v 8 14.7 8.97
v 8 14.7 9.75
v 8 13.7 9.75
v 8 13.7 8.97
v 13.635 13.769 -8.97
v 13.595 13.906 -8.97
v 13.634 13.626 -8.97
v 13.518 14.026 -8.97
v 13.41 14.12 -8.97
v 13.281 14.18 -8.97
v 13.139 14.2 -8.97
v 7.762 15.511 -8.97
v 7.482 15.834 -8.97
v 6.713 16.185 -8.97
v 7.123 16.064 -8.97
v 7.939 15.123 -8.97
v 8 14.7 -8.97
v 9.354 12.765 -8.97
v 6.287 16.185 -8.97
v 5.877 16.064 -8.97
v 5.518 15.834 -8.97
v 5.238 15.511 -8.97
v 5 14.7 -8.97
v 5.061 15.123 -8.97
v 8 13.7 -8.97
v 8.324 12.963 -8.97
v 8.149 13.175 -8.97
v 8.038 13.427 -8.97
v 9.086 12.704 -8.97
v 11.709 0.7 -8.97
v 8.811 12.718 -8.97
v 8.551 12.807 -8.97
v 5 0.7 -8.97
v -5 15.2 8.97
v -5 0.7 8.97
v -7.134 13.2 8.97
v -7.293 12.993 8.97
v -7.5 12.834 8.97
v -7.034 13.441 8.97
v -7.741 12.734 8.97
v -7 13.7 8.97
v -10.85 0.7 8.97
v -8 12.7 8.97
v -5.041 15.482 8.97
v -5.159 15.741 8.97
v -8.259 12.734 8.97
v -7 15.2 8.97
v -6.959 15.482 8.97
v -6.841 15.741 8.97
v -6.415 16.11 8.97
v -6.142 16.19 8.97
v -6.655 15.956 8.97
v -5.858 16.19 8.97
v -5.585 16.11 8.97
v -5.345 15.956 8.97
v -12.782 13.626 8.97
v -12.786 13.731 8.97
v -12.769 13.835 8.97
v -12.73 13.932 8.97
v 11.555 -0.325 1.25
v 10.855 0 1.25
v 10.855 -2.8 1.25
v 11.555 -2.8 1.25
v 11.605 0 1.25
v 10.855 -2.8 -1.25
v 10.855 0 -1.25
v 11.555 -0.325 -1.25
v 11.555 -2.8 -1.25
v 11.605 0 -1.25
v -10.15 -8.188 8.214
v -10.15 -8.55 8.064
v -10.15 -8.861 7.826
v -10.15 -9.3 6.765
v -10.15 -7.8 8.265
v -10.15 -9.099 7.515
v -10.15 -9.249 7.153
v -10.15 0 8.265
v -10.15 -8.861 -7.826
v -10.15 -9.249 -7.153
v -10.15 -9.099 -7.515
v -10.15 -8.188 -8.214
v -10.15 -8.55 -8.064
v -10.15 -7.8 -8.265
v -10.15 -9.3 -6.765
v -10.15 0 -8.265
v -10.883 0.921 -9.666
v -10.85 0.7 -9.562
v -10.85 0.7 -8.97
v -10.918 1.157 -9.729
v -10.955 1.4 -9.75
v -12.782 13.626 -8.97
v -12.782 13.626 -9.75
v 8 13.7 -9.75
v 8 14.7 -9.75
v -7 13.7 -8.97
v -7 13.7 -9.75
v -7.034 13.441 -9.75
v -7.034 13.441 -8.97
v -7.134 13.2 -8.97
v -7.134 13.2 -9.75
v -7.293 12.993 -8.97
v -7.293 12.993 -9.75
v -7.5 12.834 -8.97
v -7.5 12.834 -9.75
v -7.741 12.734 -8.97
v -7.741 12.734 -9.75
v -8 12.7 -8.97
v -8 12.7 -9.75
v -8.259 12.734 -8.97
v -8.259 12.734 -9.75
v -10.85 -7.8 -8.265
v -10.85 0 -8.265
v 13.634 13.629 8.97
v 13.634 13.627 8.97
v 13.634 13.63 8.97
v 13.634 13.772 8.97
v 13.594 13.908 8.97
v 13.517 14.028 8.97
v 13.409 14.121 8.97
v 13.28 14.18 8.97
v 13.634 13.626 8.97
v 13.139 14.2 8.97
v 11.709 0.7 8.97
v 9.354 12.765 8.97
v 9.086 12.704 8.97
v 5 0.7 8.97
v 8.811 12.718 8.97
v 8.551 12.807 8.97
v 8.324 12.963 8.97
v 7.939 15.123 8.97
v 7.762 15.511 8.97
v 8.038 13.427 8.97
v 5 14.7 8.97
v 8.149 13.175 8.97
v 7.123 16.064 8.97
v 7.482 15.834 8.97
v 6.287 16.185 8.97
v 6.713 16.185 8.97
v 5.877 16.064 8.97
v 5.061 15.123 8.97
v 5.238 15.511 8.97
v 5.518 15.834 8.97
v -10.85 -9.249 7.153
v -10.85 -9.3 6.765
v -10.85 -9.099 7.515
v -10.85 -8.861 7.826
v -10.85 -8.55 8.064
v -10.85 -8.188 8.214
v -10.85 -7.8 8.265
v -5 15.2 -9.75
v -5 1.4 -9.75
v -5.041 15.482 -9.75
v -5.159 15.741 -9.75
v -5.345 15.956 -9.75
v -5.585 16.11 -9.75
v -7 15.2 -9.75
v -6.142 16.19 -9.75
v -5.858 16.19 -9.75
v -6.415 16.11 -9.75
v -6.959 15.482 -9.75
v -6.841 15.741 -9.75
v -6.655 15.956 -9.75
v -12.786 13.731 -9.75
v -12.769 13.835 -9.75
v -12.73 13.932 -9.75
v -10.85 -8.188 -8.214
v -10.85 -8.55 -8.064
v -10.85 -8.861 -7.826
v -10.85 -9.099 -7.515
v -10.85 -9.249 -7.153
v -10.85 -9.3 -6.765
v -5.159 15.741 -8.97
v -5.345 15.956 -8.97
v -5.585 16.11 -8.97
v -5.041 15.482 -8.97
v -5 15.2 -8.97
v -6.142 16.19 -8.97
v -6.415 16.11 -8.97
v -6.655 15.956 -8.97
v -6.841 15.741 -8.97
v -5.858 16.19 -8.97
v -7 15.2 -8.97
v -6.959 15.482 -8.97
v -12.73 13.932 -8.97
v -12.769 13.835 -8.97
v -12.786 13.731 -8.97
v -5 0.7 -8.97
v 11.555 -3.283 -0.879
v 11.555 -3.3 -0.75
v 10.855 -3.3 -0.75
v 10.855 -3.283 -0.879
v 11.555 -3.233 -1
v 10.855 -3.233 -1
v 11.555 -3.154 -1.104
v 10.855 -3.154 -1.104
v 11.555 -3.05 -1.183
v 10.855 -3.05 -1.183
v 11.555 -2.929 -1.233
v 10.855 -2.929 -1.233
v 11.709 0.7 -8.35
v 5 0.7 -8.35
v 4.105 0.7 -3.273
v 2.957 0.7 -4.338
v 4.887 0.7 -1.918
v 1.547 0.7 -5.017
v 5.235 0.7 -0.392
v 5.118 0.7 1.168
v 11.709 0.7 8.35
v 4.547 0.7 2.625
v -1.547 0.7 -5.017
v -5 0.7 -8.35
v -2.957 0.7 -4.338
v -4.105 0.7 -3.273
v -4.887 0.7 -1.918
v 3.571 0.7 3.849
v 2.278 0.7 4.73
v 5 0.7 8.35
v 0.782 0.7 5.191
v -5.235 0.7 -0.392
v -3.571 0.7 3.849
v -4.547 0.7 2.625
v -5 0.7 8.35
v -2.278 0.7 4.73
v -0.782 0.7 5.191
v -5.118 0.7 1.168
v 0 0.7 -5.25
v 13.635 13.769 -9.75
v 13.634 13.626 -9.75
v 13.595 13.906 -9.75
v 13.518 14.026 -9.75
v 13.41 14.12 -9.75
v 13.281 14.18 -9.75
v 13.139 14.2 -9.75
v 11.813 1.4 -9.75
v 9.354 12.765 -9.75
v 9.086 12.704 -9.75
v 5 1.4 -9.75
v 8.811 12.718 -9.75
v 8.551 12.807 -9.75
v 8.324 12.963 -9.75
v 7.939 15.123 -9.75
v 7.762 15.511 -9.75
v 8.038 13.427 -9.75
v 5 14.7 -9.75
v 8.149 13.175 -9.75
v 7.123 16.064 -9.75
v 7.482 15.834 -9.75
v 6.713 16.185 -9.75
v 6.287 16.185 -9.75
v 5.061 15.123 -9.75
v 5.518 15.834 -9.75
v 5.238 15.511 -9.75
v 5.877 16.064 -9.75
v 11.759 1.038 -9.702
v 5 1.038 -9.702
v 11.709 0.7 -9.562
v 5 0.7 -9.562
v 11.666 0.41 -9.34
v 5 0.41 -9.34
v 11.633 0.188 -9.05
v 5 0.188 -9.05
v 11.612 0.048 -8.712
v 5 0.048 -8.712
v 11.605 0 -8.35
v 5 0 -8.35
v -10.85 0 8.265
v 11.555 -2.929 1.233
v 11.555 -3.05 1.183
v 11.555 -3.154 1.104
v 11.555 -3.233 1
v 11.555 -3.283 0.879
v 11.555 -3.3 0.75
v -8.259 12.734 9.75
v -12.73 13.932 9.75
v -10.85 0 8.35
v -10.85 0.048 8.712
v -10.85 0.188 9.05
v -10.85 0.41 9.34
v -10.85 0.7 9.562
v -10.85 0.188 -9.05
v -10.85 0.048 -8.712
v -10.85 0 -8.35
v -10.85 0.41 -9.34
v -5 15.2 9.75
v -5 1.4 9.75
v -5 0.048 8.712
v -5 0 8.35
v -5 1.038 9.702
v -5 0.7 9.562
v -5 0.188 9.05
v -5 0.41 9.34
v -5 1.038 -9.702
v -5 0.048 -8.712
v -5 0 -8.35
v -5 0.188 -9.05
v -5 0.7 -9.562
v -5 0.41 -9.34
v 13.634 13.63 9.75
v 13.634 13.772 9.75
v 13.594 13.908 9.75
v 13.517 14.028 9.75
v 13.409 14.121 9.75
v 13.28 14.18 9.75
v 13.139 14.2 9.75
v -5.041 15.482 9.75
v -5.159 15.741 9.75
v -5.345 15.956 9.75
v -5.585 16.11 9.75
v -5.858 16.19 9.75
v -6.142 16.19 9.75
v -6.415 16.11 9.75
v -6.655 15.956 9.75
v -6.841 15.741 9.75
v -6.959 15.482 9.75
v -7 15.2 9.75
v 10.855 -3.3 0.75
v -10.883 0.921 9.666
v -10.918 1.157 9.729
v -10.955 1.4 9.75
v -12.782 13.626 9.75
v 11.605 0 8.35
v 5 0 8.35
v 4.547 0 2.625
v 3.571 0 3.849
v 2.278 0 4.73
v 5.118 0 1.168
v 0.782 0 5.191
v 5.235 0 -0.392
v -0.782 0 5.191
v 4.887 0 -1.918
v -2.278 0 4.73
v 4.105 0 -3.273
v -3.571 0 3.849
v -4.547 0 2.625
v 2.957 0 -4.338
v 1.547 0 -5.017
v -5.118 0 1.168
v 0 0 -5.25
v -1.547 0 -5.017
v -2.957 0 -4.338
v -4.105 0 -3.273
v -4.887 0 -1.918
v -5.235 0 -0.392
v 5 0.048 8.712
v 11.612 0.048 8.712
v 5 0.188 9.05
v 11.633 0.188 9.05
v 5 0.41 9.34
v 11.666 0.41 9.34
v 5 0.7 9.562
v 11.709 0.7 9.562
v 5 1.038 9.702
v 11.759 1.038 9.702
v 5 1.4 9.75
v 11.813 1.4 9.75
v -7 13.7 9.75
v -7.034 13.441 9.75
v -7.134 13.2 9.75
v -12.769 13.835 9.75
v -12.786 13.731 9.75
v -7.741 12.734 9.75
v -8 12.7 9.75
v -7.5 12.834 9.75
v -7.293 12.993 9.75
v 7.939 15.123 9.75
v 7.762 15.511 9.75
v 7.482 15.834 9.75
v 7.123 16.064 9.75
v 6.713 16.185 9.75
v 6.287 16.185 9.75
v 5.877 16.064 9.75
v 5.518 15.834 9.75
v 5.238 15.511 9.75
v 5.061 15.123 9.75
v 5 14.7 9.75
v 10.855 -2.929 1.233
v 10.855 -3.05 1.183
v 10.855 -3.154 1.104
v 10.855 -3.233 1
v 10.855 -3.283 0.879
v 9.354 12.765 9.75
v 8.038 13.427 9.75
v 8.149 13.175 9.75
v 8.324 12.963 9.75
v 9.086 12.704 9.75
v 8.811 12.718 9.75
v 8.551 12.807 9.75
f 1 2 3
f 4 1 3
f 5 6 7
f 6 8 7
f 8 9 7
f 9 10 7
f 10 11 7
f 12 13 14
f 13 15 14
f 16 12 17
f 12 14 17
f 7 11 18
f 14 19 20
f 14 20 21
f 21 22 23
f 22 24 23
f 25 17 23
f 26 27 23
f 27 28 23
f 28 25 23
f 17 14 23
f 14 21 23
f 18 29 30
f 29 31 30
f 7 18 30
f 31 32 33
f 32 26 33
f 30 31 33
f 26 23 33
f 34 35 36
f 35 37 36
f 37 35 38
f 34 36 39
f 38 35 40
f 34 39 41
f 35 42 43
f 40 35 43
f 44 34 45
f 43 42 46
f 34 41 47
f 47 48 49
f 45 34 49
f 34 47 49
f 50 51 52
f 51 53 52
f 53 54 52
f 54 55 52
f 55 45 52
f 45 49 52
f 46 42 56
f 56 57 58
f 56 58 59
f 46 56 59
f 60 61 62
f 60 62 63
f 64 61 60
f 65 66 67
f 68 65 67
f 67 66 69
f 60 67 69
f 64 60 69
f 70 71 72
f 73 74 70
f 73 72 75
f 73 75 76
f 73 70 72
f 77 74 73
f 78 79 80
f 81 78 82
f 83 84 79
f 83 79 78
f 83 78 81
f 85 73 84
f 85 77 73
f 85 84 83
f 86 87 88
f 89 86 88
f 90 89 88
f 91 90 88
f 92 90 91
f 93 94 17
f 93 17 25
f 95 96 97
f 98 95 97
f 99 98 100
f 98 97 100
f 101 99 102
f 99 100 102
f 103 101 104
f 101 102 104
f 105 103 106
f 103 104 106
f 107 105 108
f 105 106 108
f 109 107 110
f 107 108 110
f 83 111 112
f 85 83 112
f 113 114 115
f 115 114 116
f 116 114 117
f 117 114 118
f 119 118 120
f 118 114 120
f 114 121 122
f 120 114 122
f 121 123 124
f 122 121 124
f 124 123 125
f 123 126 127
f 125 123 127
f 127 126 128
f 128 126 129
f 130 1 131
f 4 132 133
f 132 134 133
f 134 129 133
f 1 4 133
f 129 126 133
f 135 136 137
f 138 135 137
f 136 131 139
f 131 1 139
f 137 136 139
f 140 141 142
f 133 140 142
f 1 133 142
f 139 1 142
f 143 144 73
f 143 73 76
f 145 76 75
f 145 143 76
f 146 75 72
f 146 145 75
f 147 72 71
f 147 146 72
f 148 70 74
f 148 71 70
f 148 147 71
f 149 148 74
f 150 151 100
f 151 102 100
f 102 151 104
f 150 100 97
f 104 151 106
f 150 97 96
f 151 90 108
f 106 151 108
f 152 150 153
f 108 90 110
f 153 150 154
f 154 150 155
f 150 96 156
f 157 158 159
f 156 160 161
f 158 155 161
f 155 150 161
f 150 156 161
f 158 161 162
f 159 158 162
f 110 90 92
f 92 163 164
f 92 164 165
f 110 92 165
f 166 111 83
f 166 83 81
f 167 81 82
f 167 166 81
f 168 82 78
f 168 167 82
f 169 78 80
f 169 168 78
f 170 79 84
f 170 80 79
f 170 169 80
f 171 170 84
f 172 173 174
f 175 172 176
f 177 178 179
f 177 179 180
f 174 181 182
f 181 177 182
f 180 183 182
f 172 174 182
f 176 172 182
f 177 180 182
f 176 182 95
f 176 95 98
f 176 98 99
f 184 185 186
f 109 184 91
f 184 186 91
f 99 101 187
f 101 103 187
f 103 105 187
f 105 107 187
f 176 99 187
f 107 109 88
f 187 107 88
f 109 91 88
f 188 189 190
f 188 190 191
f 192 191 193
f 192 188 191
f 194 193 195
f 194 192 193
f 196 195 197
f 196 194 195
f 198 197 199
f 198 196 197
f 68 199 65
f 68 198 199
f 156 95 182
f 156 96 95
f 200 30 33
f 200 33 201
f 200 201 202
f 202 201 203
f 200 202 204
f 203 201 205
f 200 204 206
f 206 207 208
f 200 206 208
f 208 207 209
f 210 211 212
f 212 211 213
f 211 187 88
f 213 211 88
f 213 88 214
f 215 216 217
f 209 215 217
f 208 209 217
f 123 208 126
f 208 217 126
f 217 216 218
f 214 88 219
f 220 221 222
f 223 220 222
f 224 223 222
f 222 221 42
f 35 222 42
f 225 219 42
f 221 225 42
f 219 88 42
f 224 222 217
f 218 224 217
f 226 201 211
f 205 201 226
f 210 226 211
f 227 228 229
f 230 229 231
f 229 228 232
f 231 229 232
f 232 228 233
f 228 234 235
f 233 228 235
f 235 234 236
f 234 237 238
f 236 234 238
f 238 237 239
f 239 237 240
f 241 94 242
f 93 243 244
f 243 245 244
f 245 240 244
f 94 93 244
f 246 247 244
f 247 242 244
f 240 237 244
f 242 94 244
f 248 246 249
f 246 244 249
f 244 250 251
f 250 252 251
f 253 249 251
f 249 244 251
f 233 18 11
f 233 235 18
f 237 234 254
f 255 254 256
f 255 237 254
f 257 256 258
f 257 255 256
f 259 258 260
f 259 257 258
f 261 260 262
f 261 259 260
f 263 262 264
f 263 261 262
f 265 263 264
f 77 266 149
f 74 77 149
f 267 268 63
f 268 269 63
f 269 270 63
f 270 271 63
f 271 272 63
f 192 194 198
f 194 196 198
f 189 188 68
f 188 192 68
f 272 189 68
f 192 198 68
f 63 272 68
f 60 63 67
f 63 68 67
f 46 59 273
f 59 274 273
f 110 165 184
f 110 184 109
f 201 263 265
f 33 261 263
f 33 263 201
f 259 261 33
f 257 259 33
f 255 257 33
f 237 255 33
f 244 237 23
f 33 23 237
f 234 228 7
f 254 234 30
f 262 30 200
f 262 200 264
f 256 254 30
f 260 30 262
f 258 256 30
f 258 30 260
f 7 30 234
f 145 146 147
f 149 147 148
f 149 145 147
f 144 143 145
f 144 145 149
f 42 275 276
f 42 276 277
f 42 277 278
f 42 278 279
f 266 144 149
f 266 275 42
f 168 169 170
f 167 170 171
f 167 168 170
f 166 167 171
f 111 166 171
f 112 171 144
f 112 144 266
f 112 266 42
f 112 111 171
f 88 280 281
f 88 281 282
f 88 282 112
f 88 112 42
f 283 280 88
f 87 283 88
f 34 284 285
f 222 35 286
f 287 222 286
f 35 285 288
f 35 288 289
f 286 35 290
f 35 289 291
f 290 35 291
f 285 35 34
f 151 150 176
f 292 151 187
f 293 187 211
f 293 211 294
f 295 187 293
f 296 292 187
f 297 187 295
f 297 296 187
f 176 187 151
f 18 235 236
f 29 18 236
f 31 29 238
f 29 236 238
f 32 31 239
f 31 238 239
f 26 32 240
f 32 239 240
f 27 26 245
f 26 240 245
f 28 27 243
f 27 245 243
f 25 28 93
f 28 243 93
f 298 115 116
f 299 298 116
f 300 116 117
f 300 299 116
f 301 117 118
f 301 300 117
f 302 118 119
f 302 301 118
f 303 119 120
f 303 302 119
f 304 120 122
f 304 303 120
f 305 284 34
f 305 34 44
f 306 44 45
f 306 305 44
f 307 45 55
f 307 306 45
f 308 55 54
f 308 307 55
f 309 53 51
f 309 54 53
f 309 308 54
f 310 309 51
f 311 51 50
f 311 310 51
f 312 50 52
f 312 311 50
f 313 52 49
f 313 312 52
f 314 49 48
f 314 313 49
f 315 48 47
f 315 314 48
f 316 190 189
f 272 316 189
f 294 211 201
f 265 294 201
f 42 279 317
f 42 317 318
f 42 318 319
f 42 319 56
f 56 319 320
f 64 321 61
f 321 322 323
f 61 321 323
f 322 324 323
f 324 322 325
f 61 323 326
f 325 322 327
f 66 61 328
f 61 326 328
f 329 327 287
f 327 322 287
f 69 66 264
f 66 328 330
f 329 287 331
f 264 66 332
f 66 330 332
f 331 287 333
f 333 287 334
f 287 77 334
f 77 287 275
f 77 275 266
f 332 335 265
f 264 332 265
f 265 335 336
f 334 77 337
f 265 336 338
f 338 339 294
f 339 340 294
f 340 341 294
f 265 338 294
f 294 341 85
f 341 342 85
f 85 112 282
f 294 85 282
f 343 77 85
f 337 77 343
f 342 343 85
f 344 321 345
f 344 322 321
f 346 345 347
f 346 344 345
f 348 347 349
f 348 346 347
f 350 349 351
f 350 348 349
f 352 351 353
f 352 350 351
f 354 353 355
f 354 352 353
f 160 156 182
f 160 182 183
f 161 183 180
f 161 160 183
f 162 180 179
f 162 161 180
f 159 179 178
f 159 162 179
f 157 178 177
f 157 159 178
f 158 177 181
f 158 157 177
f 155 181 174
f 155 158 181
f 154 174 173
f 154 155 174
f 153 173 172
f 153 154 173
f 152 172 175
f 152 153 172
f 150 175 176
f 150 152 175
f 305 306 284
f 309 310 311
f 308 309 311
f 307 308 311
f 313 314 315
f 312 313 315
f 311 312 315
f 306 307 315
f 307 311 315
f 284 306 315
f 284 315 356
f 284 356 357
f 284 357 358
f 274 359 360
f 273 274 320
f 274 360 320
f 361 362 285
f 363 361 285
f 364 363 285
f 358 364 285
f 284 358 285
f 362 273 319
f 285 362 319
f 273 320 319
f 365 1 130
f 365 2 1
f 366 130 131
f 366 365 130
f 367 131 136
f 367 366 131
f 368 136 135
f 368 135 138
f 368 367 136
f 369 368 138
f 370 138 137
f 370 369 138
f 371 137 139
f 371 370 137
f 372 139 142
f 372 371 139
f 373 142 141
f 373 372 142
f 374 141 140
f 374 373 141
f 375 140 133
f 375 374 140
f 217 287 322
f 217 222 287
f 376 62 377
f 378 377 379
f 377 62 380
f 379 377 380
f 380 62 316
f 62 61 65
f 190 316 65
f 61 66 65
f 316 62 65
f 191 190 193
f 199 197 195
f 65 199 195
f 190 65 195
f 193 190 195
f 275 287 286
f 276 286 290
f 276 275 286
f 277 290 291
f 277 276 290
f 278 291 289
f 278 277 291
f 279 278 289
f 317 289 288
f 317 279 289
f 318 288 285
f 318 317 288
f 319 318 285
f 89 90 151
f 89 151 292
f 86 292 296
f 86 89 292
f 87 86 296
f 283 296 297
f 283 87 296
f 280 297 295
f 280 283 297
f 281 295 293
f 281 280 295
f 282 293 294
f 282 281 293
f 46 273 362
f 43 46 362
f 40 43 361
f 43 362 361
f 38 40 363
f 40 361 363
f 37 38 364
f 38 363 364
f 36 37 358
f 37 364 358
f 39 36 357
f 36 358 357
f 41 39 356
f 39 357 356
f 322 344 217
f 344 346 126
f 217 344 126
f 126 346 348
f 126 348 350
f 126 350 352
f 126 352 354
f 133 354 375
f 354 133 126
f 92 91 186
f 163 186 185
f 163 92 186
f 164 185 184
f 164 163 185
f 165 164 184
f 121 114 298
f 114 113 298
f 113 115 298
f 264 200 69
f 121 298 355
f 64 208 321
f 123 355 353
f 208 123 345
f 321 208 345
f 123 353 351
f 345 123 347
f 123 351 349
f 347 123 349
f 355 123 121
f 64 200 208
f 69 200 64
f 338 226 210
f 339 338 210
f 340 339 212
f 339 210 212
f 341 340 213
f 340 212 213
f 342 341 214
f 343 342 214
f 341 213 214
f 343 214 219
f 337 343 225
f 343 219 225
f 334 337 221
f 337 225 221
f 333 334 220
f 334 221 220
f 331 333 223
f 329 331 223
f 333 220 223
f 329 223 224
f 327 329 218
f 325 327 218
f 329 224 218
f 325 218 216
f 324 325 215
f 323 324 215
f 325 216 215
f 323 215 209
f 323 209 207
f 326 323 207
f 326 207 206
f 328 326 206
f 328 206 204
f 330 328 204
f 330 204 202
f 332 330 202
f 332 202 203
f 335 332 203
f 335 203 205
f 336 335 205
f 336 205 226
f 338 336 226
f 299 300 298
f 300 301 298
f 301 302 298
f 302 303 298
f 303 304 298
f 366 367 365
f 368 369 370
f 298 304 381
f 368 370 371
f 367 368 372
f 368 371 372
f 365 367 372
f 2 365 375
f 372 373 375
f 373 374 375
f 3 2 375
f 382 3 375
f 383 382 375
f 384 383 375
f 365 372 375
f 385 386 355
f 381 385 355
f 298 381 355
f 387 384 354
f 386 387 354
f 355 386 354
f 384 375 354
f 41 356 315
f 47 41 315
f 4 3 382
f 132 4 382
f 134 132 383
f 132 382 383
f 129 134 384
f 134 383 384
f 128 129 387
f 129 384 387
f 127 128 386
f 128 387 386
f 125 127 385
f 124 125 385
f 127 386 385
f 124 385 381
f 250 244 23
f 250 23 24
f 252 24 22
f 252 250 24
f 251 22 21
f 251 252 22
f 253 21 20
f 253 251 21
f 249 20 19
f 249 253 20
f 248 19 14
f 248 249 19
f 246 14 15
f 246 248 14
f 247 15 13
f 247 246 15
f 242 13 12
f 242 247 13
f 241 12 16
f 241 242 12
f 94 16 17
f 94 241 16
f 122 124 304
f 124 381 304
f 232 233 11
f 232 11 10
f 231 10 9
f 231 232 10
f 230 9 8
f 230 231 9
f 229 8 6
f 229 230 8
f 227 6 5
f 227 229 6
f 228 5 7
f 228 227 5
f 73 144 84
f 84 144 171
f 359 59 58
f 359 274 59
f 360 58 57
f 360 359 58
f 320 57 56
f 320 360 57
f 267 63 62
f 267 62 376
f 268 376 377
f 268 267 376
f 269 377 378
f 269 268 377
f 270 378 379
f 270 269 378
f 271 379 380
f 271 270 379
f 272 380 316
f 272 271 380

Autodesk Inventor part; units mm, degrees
sketch "Sketch_1" plane through (0, 0, 0) normal (1, 0, 0) x (0, 1, 0)
  arc A0 (1.4, 9.75) -> (0, 8.35) centre (1.4, 8.35) ccw
  line L0 (0, 8.35) -> (0, -8.35)
  arc A1 (0, -8.35) -> (1.4, -9.75) centre (1.4, -8.35) ccw
  line L1 (1.4, -9.75) -> (16.2, -9.75)
  line L2 (16.2, -9.75) -> (16.2, -8.97)
  line L3 (16.2, -8.97) -> (0.7, -8.97)
  line L4 (0.7, -8.97) -> (0.7, 8.97)
  line L5 (0.7, 8.97) -> (16.2, 8.97)
  line L6 (16.2, 8.97) -> (16.2, 9.75)
  line L7 (16.2, 9.75) -> (1.4, 9.75)
extrude "Extrusion1" add sketch "Sketch_1" along normal mid plane 29.8667
sketch "Sketch_3" plane through (0, 0, 9.75) normal (0, 0, 1) x (1, 0, 0)
  line L0 (-22, 25) -> (-22, 0)
  line L1 (-22, 0) -> (-10.85, 0)
  line L2 (-10.85, 0) -> (-10.85, 0.7)
  line L3 (-10.85, 0.7) -> (-12.7818, 13.6261)
  arc A0 (-12.7301, 13.9322) -> (-12.7818, 13.6261) centre (-12.2873, 13.7) ccw
  line L4 (-12.7301, 13.9322) -> (-8.2588, 12.7341)
  arc A1 (-8.2588, 12.7341) -> (-7, 13.7) centre (-8, 13.7) ccw
  line L5 (-7, 13.7) -> (-7, 15.2)
  arc A2 (-5, 15.2) -> (-7, 15.2) centre (-6, 15.2) ccw
  line L6 (-5, 15.2) -> (-5, 0)
  line L7 (-5, 0) -> (5, 0)
  line L8 (5, 0) -> (5, 14.7)
  arc A3 (8, 14.7) -> (5, 14.7) centre (6.5, 14.7) ccw
  line L9 (8, 14.7) -> (8, 13.7)
  arc A4 (8, 13.7) -> (9.3545, 12.765) centre (9, 13.7) ccw
  line L10 (9.3545, 12.765) -> (13.1394, 14.2)
  arc A5 (13.6339, 13.6264) -> (13.1394, 14.2) centre (13.1394, 13.7) ccw
  line L11 (13.6339, 13.6264) -> (11.6047, 0)
  line L12 (11.6047, 0) -> (22, 0)
  line L13 (22, 0) -> (22, 25)
  line L14 (22, 25) -> (-22, 25)
extrude "Extrusion2" cut sketch "Sketch_3" against normal blind 1.4
sketch "Sketch_2" plane through (0, 0, -9.75) normal (0, 0, 1) x (1, 0, 0)
  line L0 (-22, 25) -> (-22, 0)
  line L1 (-22, 0) -> (-10.85, 0)
  line L2 (-10.85, 0) -> (-10.85, 0.7)
  line L3 (-10.85, 0.7) -> (-12.7818, 13.6261)
  arc A0 (-12.7301, 13.9322) -> (-12.7818, 13.6261) centre (-12.2873, 13.7) ccw
  line L4 (-12.7301, 13.9322) -> (-8.2588, 12.7341)
  arc A1 (-8.2588, 12.7341) -> (-7, 13.7) centre (-8, 13.7) ccw
  line L5 (-7, 13.7) -> (-7, 15.2)
  arc A2 (-5, 15.2) -> (-7, 15.2) centre (-6, 15.2) ccw
  line L6 (-5, 15.2) -> (-5, 0)
  line L7 (-5, 0) -> (5, 0)
  line L8 (5, 0) -> (5, 14.7)
  arc A3 (8, 14.7) -> (5, 14.7) centre (6.5, 14.7) ccw
  line L9 (8, 14.7) -> (8, 13.7)
  arc A4 (8, 13.7) -> (9.3545, 12.765) centre (9, 13.7) ccw
  line L10 (9.3545, 12.765) -> (13.1394, 14.2)
  arc A5 (13.6339, 13.6264) -> (13.1394, 14.2) centre (13.1394, 13.7) ccw
  line L11 (13.6339, 13.6264) -> (11.6047, 0)
  line L12 (11.6047, 0) -> (22, 0)
  line L13 (22, 0) -> (22, 25)
  line L14 (22, 25) -> (-22, 25)
extrude "Extrusion3" cut sketch "Sketch_2" along normal blind 1.4
sketch "Sketch4" plane through (-5, 0, 8.35) normal (0, -1, 0) x (1, 0, 0)
  point P0 (5, -8.35)
hole "Hole1" at (0, 0, 0) direction (0, 1, 0) diameter 10.5 depth 1
sketch "Sketch_5" plane through (0, 0, 0) normal (0, 0, 1) x (1, 0, 0)
  line L0 (-15.85, 1) -> (-15.85, -1)
  line L1 (-15.85, -1) -> (15.62, -1)
  line L2 (15.62, -1) -> (15.62, 1)
  line L3 (15.62, 1) -> (12.12, 1)
  line L4 (12.12, 1) -> (12.12, 0)
  line L5 (12.12, 0) -> (-10.85, 0)
  line L6 (-10.85, 0) -> (-10.85, 1)
  line L7 (-10.85, 1) -> (-15.85, 1)
extrude "Extrusion4" cut sketch "Sketch_5" along normal mid plane 16.7
sketch "Sketch_9" plane through (0, 0, 9.75) normal (0, 0, 1) x (1, 0, 0)
  line L0 (11.6047, 0) -> (22, 0)
  line L1 (22, 0) -> (22, 25)
  line L2 (22, 25) -> (15.3276, 25)
  line L3 (15.3276, 25) -> (11.6047, 0)
extrude "Extrusion5" cut sketch "Sketch_9" against normal blind 19.5
sketch "Sketch_6" plane through (-10.85, 0, 0) normal (1, 0, 0) x (0, 0, -1)
  arc A0 (-8.265, -7.8) -> (-6.765, -9.3) centre (-6.765, -7.8) ccw
  line L0 (-6.765, -9.3) -> (6.765, -9.3)
  arc A1 (6.765, -9.3) -> (8.265, -7.8) centre (6.765, -7.8) ccw
  line L1 (8.265, -7.8) -> (8.265, 0.7)
  line L2 (8.265, 0.7) -> (-8.265, 0.7)
  line L3 (-8.265, 0.7) -> (-8.265, -7.8)
extrude "Extrusion6" add sketch "Sketch_6" along normal blind 0.7
sketch "Sketch_7" plane through (0, 0, 0) normal (0, 0, 1) x (1, 0, 0)
  line L0 (10.8547, -3.3) -> (11.5547, -3.3)
  line L1 (11.5547, -3.3) -> (11.5547, -0.3252)
  line L2 (11.5547, -0.3252) -> (11.6047, 0)
  line L3 (11.6047, 0) -> (11.6047, 0.7)
  line L4 (11.6047, 0.7) -> (10.8547, 0.7)
  line L5 (10.8547, 0.7) -> (10.8547, -3.3)
extrude "Extrusion7" add sketch "Sketch_7" along normal mid plane 2.5
sketch "Sketch_8" plane through (11.555, 0, 0) normal (1, 0, 0) x (0, 0, -1)
  line L0 (-1.5, -0.5) -> (-1.5, -4.5)
  line L1 (-1.5, -4.5) -> (1.5, -4.5)
  line L2 (1.5, -4.5) -> (1.5, -0.5)
  line L3 (1.5, -0.5) -> (1.25, -0.5)
  line L4 (1.25, -0.5) -> (1.25, -2.8)
  arc A0 (0.75, -3.3) -> (1.25, -2.8) centre (0.75, -2.8) ccw
  line L5 (0.75, -3.3) -> (-0.75, -3.3)
  arc A1 (-1.25, -2.8) -> (-0.75, -3.3) centre (-0.75, -2.8) ccw
  line L6 (-1.25, -2.8) -> (-1.25, -0.5)
  line L7 (-1.25, -0.5) -> (-1.5, -0.5)
extrude "Extrusion8" cut sketch "Sketch_8" against normal blind 0.78
ref_plane "washer_to_base_XY" through (0, -0.48, 0) normal (0, 1, 0) x (1, 0, 0)
ref_plane "washer_to_base_YZ" through (0, -0.48, 0) normal (1, 0, 0) x (0, 0, -1)
ref_plane "washer_to_base_ZX" through (0, -0.48, 0) normal (0, 0, -1) x (0, 1, 0)
ref_plane "washer_to_insert_XY" through (0, 0.7, 0) normal (0, 1, 0) x (1, 0, 0)
ref_plane "washer_to_insert_YZ" through (0, 0.7, 0) normal (1, 0, 0) x (0, 0, -1)
ref_plane "washer_to_insert_ZX" through (0, 0.7, 0) normal (0, 0, -1) x (0, 1, 0)
properties part number "lock_washer_na"
